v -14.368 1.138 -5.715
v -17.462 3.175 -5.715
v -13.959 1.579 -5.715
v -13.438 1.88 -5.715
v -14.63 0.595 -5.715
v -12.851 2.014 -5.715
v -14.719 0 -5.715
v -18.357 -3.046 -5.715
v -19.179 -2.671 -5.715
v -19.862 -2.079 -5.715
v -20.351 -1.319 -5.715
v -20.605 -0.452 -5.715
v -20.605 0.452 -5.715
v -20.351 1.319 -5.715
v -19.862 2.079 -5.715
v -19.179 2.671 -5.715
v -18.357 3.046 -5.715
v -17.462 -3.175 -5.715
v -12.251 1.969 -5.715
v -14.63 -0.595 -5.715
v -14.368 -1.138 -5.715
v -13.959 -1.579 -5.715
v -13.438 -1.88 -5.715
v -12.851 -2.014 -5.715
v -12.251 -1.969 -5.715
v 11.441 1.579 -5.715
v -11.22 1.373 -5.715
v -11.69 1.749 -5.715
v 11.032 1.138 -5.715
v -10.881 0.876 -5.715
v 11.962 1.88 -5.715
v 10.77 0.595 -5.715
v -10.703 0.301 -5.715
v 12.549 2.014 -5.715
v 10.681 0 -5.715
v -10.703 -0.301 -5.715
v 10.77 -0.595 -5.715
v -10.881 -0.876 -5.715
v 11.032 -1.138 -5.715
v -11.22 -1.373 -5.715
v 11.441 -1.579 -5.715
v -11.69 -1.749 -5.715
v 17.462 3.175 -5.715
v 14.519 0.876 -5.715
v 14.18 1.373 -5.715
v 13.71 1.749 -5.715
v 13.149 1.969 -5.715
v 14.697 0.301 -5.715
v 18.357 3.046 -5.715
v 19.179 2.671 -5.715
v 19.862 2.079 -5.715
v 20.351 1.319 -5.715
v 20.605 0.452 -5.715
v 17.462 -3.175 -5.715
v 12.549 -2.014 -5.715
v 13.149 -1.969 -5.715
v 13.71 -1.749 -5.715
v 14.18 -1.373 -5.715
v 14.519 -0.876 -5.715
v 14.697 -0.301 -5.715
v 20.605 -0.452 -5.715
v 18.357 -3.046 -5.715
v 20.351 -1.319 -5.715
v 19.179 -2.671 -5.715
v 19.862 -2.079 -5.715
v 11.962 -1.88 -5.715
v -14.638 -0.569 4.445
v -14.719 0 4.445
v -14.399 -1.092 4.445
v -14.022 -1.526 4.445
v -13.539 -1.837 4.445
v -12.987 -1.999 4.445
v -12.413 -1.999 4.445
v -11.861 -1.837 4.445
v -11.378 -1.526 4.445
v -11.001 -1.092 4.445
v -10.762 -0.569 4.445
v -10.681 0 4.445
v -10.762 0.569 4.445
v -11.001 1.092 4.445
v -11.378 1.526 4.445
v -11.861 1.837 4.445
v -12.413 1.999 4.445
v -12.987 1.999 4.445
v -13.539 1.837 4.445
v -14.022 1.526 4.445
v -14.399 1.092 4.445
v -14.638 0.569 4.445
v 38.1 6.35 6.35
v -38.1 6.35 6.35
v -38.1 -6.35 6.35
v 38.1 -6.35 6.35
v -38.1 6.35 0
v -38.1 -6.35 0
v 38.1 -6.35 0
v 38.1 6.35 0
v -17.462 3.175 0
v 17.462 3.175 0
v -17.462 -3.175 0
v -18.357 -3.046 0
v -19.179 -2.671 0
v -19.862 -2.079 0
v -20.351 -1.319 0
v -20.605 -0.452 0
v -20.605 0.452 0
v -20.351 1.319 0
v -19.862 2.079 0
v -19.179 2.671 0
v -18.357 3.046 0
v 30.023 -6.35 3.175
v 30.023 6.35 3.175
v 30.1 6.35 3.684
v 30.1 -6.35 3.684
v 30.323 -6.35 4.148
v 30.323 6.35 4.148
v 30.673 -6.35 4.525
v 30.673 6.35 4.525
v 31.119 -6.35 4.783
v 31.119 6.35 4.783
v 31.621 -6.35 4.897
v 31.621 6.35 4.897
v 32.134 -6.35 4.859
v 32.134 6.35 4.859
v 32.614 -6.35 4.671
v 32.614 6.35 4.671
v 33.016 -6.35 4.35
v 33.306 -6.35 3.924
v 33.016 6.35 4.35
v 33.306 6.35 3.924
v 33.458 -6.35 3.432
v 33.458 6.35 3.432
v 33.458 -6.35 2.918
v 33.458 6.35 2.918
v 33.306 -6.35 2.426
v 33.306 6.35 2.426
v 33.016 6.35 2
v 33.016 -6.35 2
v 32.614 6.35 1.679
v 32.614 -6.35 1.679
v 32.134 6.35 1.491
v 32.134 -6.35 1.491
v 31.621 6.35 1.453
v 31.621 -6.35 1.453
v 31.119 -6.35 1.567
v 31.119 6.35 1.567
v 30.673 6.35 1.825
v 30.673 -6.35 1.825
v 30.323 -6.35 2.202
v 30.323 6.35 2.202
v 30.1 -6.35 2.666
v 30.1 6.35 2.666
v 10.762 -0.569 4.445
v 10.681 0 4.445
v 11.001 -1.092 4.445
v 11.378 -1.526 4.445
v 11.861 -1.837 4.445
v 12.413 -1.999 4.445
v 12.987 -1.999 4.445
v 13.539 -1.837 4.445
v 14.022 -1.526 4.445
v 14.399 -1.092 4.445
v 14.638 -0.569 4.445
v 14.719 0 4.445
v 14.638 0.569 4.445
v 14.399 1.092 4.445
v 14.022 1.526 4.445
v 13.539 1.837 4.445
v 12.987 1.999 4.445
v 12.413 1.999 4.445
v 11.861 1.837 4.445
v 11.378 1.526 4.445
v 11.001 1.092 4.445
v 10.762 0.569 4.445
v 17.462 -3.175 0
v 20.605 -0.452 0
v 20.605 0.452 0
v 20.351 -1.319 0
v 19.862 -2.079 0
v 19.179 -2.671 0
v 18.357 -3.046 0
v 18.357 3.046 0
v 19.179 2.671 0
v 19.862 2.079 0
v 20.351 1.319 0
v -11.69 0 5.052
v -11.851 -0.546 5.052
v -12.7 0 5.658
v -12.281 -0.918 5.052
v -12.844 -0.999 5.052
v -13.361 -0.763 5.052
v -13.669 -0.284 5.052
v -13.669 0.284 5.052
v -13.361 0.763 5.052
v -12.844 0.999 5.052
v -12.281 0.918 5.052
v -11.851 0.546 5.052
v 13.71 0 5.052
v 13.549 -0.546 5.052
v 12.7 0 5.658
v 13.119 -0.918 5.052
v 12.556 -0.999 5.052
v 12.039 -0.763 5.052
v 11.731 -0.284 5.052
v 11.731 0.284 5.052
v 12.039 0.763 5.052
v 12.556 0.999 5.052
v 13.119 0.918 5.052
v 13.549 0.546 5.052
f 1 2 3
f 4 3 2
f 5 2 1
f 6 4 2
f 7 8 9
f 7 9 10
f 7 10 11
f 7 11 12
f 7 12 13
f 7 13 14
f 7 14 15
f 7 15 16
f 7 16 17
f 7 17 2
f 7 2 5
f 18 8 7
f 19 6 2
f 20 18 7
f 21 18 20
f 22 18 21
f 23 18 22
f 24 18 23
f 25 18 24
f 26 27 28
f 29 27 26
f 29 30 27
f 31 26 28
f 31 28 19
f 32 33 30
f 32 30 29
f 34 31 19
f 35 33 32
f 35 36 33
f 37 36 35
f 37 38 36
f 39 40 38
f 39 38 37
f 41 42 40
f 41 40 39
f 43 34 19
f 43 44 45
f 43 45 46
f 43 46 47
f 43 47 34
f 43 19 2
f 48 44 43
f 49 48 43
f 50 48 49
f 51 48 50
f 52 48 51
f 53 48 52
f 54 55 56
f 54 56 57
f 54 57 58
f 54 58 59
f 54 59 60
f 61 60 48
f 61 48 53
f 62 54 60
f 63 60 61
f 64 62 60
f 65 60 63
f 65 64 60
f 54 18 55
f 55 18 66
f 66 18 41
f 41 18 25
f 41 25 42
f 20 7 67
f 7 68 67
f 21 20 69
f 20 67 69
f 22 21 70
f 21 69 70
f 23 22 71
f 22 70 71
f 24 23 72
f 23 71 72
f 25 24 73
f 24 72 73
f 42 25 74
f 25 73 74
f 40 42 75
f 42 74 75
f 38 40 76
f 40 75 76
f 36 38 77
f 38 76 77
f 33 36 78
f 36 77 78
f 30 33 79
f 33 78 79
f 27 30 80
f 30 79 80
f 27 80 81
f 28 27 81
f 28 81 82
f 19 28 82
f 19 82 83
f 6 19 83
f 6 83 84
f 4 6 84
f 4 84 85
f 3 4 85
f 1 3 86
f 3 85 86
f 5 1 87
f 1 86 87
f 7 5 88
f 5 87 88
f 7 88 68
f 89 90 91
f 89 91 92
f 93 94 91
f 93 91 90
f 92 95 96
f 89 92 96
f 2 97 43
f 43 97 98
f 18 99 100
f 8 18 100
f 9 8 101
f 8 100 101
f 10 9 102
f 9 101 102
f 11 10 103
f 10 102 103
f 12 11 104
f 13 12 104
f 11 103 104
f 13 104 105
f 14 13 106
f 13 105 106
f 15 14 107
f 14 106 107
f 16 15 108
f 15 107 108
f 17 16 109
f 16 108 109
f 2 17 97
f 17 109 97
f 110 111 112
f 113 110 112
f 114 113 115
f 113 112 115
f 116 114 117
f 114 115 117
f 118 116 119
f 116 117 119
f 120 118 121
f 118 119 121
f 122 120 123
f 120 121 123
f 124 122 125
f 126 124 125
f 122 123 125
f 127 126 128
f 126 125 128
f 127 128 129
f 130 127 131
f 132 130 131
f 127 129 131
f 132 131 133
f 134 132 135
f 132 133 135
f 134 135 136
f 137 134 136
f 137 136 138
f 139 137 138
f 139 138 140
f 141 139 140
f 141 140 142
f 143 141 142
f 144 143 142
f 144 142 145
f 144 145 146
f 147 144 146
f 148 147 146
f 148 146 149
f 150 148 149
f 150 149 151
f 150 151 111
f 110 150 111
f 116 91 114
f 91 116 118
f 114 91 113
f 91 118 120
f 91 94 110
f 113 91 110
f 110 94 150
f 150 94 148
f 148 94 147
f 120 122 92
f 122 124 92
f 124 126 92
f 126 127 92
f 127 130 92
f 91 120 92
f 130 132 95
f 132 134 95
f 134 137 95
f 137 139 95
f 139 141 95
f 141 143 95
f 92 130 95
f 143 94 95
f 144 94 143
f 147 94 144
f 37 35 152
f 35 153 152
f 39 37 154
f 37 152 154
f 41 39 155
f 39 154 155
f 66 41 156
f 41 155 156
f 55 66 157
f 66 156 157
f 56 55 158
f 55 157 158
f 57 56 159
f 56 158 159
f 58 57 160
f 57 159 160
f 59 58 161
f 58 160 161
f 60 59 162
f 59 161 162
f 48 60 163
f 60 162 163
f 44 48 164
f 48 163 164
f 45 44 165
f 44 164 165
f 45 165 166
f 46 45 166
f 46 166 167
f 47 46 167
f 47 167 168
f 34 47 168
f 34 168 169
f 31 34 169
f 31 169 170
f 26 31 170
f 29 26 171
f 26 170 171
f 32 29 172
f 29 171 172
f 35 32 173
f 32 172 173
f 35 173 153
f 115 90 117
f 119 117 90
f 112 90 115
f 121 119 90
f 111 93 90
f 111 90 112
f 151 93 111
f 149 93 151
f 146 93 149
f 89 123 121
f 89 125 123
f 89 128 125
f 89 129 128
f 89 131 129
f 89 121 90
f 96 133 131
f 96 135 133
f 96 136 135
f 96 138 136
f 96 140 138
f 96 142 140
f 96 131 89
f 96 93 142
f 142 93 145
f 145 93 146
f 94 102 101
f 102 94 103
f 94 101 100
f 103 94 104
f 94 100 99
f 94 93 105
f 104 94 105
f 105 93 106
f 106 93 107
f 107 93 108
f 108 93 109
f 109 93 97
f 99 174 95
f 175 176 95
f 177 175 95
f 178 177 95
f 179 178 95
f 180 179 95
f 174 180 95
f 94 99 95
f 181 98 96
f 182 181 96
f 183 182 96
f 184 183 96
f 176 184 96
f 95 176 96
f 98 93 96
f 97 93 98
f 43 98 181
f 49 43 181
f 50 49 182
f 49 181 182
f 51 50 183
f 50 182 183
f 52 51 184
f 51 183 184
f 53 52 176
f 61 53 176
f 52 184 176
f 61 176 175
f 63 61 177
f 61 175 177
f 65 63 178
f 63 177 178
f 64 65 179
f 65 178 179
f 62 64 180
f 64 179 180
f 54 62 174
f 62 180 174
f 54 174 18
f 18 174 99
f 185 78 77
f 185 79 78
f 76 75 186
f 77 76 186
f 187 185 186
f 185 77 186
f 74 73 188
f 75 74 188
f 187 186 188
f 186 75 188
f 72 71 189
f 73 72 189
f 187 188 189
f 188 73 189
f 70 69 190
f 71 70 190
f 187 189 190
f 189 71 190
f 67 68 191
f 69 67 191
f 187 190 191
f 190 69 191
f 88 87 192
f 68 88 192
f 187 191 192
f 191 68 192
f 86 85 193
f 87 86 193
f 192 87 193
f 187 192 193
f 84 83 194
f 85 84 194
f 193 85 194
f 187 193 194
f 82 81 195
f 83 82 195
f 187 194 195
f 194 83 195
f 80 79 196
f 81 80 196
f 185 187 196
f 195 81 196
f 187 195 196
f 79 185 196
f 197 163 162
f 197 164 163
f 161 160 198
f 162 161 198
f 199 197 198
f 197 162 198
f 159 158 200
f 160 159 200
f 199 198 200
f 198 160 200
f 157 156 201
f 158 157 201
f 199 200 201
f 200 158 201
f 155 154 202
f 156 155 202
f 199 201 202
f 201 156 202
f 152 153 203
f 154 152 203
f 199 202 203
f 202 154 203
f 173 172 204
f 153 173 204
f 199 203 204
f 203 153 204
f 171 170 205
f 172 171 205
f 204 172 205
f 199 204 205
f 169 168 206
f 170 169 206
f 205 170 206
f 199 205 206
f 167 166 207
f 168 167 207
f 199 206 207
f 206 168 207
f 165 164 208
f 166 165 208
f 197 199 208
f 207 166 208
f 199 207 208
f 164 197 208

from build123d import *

# Parameters (mm, degrees)
F0_W     = 76.2
F0_H     = 12.7
F1_DEPTH = 6.35
F4_D     = 3.4544
F6_DEPTH = 5.715
F8_D     = 4.0386
F8_DEPTH = 10.16
F8_TIP   = 1.213317848


with BuildPart() as f1:
    # F0 (on Top) → F1 (new body)
    with BuildSketch(Plane.XY):
        Rectangle(F0_W, F0_H)
    extrude(amount=F1_DEPTH)

    # F4 (through all)
    with Locations(Plane.XZ.offset(6.35)):
        with Locations((31.75, 3.175)):
            Hole(F4_D / 2)

    # F5 (on face) → F6 (join)
    with BuildSketch(Plane(origin=(0, 0, 0), x_dir=(1, 0, 0), z_dir=(0, 0, -1))):
        with BuildLine():
            ThreePointArc((-17.4625, 3.175), (-20.6375, 0), (-17.4625, -3.175))
            Line((-17.4625, -3.175), (17.4625, -3.175))
            ThreePointArc((17.4625, -3.175), (20.6375, 0), (17.4625, 3.175))
            Line((17.4625, 3.175), (-17.4625, 3.175))
        make_face()
    extrude(amount=F6_DEPTH)

    # F8
    with Locations(Plane(origin=(0, 0, -5.715), x_dir=(1, 0, 0), z_dir=(0, 0, -1))):
        with Locations((-12.7, 0), (12.7, 0)):
            Hole(F8_D / 2, depth=F8_DEPTH)
            with Locations((0, 0, -(F8_DEPTH + F8_TIP / 2))):  # 118° drill point
                Cone(0, F8_D / 2, F8_TIP, mode=Mode.SUBTRACT)


solid = f1.part
